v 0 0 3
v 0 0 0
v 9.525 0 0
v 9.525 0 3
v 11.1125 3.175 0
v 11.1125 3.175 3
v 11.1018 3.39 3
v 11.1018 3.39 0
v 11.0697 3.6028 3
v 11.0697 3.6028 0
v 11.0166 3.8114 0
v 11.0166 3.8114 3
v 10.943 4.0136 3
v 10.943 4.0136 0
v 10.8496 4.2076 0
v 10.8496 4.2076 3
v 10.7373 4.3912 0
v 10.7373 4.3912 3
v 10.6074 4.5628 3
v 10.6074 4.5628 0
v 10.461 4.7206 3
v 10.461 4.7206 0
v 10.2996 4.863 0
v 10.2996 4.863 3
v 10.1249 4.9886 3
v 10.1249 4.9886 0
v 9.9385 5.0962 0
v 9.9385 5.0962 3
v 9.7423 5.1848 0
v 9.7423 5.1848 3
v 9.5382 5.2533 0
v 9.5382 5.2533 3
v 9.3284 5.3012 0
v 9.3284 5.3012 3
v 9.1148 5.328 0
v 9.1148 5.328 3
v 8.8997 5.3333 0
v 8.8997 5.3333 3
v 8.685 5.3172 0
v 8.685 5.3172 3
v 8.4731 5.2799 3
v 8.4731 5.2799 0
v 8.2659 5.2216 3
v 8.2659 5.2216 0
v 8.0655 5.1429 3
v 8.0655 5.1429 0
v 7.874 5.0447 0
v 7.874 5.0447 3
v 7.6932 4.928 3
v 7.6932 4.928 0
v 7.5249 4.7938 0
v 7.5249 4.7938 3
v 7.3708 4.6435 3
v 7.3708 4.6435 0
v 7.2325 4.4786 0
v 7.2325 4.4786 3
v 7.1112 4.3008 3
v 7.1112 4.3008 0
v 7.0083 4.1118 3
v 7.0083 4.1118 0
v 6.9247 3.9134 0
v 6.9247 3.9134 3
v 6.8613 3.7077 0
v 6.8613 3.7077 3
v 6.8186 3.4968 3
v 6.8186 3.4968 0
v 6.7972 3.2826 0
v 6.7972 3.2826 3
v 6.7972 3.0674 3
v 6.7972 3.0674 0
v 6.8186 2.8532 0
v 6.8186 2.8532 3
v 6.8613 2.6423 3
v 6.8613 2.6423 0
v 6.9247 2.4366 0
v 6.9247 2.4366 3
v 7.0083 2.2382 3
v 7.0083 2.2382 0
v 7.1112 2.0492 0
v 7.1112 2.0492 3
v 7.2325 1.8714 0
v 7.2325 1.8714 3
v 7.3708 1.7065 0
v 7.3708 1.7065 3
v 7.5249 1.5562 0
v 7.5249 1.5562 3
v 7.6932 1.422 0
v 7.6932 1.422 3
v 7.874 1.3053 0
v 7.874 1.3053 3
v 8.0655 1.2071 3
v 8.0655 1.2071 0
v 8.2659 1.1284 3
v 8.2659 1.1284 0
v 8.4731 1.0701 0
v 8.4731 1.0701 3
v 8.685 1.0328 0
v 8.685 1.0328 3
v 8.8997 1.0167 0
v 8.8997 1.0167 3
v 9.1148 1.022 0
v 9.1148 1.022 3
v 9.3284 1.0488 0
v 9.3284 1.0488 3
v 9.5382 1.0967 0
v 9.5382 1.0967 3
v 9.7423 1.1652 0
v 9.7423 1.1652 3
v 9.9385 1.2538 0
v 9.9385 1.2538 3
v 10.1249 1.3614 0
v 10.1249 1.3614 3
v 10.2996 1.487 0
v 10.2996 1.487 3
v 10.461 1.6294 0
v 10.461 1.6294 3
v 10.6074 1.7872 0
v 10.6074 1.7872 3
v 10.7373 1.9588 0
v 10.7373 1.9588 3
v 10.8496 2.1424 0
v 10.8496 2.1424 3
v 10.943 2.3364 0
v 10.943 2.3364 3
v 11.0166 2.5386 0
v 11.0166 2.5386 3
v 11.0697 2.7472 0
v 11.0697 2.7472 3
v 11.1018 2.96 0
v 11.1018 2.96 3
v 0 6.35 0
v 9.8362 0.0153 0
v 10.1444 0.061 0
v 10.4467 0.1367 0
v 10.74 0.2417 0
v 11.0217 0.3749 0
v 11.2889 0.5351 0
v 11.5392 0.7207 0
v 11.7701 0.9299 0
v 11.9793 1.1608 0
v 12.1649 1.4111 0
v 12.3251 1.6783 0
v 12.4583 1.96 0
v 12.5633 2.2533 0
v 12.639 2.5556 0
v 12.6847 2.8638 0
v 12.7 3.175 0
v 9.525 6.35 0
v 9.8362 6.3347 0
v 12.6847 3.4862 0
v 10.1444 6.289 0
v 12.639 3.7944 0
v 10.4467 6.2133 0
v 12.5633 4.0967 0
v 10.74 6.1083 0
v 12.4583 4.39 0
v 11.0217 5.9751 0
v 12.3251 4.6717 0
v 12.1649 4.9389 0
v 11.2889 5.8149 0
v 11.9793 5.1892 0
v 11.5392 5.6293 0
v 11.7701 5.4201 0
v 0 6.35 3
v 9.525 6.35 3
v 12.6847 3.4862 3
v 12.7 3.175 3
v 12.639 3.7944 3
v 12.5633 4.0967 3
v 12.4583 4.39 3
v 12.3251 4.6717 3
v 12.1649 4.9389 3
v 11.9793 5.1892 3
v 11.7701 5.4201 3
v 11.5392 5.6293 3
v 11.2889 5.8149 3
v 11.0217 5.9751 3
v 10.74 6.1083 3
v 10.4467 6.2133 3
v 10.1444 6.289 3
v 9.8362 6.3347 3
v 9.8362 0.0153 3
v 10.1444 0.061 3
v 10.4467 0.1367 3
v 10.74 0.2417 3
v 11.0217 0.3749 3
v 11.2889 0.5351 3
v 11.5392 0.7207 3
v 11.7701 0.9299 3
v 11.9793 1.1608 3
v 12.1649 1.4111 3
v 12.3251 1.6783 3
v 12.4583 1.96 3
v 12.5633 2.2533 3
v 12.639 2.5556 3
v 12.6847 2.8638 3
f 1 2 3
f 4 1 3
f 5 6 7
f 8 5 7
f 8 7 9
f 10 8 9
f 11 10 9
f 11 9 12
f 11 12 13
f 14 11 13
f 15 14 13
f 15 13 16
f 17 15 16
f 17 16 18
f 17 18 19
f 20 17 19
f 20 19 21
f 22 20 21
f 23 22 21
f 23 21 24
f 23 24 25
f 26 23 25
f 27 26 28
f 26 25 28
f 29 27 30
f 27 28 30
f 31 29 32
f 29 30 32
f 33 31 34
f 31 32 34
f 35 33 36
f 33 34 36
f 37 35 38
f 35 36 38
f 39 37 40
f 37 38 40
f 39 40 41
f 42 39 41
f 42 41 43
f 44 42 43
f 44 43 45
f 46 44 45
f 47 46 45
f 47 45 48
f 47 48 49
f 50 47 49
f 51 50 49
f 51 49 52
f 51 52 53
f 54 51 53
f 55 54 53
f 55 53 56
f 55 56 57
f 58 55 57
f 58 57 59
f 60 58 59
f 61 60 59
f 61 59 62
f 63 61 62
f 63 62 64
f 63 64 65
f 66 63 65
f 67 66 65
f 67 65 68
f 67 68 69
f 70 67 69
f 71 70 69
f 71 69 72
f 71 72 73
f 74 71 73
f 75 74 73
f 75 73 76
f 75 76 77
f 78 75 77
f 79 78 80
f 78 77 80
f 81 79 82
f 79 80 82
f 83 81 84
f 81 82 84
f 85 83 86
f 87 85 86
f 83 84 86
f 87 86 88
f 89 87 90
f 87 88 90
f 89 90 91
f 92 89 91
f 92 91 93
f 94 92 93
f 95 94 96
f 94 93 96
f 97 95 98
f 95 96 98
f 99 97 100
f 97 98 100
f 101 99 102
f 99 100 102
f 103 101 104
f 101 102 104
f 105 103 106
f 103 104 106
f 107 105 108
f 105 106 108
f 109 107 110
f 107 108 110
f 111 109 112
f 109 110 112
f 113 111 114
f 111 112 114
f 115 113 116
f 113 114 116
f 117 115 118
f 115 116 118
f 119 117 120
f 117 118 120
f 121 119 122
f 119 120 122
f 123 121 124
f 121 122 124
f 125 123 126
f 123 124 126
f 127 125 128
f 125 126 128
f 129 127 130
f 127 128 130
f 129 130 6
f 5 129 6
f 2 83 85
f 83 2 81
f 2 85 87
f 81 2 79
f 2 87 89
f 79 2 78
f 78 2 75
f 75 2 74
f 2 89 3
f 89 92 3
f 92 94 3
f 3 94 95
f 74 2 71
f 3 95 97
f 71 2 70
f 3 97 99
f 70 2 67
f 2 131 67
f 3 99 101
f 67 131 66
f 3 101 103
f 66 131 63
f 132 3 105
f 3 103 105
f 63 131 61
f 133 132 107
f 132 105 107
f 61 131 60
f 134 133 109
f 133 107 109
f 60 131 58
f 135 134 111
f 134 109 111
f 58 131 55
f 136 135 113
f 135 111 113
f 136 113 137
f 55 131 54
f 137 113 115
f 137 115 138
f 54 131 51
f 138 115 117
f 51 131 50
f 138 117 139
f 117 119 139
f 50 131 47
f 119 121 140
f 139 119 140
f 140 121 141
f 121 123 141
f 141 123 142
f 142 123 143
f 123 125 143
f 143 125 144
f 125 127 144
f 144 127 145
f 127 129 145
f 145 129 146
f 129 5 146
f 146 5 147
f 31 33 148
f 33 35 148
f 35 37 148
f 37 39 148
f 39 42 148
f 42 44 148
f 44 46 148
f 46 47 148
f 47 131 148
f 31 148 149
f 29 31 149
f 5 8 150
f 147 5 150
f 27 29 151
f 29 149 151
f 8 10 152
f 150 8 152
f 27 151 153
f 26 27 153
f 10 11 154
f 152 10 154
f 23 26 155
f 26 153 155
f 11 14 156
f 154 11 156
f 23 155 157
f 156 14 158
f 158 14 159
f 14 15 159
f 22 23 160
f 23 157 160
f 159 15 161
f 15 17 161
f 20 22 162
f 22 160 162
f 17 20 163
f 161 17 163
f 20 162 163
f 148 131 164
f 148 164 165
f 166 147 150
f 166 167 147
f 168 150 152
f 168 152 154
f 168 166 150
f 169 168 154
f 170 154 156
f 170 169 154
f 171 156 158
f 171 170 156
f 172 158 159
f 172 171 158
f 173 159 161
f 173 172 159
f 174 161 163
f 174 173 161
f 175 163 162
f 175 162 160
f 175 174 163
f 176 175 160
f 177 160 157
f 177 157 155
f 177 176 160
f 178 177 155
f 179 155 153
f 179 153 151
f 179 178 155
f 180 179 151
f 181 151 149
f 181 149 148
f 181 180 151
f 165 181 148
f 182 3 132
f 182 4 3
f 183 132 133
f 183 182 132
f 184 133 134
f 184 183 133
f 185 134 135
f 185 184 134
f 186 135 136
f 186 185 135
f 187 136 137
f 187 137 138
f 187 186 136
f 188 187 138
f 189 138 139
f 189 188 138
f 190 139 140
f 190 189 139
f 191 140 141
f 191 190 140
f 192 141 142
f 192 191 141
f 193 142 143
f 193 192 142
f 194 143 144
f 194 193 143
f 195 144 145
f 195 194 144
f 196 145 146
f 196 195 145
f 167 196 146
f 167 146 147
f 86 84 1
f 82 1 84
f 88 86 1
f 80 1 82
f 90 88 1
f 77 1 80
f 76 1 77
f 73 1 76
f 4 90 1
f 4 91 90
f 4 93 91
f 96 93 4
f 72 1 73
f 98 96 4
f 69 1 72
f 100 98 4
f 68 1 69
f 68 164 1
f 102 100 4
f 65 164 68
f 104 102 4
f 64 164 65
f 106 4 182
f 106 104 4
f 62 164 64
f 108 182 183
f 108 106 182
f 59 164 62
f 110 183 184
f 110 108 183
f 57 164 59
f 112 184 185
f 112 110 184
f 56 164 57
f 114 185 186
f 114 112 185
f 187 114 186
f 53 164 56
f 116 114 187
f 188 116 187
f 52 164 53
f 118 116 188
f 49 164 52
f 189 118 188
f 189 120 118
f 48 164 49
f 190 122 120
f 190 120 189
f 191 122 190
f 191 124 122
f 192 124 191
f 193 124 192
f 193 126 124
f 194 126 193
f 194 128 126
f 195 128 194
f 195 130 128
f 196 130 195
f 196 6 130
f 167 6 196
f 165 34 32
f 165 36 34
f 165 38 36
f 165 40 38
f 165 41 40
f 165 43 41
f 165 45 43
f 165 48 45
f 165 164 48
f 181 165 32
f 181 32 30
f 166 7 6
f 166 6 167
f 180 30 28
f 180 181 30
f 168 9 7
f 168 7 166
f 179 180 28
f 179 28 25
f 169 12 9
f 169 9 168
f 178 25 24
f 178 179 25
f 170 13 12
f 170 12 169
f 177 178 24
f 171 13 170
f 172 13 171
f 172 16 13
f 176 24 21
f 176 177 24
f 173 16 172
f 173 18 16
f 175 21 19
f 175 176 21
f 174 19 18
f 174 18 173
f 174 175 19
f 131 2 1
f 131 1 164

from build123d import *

# Parameters (mm, degrees)
F0_W     = 12.7
F0_H     = 6.35
F1_DEPTH = 3
F3_R     = 3.17499
F2_R     = 2.159
F4_DEPTH = 25.4


# Not quite as in the source:
# - a fillet or chamfer is up to 0.001 mm smaller than in the source, because OpenCascade refuses the exact size


with BuildPart() as f1:
    # F0 (on Top) → F1 (new body)
    with BuildSketch(Plane.XY):
        with Locations((6.35, 3.175)):
            Rectangle(F0_W, F0_H)
    extrude(amount=F1_DEPTH)

    # F3 (radius 3.175 in the source; OpenCascade refuses exactly that, so slightly less here)
    f3_edges = [f1.edges().sort_by_distance(p)[0] for p in [
        (12.7, 6.35, 1.5),
        (12.7, 0, 1.5),
    ]]
    fillet(f3_edges, radius=F3_R)

    # F2 (on face) → F4 (cut)
    with BuildSketch(Plane.XY.offset(3)):
        with Locations((8.9535, 3.175)):
            Circle(F2_R)
    extrude(amount=-F4_DEPTH, mode=Mode.SUBTRACT)


solid = f1.part
